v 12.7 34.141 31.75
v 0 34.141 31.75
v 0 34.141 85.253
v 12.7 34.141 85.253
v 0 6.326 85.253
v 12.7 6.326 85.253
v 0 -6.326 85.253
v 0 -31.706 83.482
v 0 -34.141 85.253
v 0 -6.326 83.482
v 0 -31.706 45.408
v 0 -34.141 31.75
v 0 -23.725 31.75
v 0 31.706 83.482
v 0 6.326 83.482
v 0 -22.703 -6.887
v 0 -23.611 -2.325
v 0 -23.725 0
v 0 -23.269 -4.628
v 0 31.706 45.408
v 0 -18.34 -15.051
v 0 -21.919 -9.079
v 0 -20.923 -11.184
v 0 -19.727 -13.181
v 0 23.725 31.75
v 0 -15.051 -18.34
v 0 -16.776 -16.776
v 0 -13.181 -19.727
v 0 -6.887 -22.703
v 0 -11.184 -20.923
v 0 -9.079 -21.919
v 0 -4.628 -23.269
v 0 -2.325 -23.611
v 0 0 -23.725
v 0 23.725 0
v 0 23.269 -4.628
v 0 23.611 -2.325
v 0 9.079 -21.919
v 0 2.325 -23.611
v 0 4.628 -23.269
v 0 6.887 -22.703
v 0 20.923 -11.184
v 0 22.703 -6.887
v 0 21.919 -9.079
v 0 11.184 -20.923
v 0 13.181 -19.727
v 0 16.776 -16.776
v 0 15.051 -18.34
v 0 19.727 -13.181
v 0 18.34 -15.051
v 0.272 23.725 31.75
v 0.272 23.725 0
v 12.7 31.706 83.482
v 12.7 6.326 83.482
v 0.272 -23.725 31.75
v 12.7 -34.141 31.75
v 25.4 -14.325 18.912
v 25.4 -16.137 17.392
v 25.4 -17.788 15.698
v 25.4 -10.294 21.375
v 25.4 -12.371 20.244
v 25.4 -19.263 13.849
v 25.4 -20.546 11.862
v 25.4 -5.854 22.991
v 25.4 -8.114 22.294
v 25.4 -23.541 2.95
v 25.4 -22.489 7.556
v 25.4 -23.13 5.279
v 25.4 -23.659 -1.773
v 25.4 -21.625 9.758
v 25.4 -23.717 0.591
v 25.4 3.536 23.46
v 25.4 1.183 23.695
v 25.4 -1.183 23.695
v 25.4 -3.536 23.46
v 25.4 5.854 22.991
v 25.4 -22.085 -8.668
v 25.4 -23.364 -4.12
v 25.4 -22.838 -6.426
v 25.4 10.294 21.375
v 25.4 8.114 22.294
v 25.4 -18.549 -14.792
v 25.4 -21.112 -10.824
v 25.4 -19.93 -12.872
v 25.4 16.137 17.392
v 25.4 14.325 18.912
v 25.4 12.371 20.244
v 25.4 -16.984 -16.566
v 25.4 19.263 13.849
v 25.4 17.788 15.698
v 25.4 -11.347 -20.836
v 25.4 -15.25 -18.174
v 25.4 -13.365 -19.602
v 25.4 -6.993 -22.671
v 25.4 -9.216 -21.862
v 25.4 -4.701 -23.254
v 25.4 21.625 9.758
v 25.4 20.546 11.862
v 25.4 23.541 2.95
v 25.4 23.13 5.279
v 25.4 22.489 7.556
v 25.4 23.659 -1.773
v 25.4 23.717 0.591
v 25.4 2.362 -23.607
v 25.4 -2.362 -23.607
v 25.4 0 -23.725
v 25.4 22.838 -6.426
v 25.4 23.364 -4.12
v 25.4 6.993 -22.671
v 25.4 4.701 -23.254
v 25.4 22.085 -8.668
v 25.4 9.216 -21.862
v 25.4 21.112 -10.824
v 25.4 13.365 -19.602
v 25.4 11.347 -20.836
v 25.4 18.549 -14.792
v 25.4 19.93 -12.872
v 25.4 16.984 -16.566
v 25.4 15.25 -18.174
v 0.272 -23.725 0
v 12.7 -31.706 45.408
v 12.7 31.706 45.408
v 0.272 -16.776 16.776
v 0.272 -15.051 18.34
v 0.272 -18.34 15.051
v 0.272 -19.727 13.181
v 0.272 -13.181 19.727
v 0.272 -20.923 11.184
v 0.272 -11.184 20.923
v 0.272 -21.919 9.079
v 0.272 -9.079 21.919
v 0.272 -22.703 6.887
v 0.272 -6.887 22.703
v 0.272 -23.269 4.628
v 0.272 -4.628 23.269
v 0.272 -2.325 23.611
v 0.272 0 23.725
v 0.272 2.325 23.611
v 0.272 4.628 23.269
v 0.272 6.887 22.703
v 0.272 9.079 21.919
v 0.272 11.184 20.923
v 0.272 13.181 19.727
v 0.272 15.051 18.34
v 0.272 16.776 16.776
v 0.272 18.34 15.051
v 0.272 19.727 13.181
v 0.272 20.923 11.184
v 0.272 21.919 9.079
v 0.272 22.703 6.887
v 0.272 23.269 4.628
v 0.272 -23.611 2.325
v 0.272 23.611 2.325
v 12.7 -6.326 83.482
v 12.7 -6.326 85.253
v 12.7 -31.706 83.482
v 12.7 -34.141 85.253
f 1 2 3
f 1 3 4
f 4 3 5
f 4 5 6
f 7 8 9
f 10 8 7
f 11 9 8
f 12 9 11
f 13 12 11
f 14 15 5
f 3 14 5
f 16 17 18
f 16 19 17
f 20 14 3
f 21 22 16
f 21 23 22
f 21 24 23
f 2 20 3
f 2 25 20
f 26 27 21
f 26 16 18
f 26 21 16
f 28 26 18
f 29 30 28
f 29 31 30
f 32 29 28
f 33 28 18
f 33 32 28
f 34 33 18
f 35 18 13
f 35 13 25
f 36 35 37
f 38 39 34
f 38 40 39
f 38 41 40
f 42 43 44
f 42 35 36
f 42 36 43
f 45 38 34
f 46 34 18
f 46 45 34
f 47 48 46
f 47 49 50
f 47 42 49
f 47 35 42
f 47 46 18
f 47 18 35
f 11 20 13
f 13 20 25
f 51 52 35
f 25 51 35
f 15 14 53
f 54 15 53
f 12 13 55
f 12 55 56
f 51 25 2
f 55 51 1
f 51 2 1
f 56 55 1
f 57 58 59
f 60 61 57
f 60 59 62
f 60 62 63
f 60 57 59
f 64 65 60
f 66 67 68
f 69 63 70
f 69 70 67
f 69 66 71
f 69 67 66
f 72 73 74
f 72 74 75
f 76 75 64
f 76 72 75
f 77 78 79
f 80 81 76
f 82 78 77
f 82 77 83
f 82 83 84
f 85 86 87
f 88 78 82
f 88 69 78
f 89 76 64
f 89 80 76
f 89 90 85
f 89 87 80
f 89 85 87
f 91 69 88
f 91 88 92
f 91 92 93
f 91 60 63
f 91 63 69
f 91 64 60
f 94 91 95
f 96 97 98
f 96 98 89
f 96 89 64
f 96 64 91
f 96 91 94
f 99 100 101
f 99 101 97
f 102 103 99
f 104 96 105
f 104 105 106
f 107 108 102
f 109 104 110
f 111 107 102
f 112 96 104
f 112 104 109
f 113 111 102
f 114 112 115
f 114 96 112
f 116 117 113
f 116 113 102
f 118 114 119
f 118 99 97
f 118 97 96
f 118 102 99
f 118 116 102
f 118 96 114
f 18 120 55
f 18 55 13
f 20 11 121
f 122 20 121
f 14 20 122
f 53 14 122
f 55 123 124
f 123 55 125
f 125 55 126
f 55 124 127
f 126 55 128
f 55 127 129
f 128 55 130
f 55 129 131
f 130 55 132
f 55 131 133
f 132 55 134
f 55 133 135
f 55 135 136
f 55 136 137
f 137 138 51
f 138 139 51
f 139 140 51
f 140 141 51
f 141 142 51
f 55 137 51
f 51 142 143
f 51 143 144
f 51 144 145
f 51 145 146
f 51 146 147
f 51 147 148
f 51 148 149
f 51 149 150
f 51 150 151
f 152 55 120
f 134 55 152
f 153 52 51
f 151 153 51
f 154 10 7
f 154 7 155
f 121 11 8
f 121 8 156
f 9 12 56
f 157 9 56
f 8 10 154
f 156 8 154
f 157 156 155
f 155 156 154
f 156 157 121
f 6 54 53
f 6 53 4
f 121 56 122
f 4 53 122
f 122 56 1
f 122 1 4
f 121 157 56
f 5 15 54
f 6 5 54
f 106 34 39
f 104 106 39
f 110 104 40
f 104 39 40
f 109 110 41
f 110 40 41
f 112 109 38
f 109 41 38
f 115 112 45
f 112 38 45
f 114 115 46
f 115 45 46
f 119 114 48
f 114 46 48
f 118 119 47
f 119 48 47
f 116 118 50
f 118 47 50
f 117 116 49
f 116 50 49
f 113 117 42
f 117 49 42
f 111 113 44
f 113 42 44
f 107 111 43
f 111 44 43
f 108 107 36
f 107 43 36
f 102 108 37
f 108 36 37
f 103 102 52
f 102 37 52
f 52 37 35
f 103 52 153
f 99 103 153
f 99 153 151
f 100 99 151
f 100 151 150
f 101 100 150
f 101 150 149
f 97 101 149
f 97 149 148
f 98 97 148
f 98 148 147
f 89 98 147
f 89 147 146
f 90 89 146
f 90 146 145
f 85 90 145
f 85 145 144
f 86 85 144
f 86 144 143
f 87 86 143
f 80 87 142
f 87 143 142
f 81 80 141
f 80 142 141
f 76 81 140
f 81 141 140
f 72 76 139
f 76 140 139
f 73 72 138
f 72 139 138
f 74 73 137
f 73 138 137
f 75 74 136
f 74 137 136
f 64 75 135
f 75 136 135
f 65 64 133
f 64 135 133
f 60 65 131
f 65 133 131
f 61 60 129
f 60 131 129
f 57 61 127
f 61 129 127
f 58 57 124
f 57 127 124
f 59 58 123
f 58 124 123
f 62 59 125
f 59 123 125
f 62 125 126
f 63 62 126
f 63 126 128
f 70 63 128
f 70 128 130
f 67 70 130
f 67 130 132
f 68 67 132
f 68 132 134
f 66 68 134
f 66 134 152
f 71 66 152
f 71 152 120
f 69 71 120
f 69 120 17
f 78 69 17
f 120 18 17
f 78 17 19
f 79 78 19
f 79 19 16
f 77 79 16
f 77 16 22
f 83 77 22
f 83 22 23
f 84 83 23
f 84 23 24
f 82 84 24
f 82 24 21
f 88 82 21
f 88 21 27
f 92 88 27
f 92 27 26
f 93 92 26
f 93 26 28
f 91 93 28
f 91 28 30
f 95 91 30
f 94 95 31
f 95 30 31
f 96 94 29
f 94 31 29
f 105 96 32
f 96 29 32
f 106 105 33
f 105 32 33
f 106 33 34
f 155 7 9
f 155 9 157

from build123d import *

# Parameters (mm, degrees)
SKETCH1_R           = 23.72487
BOSS_EXTRUDE1_DEPTH = 25.4
SKETCH2_W           = 47.44974
SKETCH2_H           = 0.27178
BOSS_EXTRUDE2_DEPTH = 31.75
SKETCH3_W           = 12.7
SKETCH3_H           = 68.28282
BOSS_EXTRUDE3_DEPTH = 13.65758
SKETCH4_W           = 12.7
SKETCH4_H           = 2.43586
BOSS_EXTRUDE4_DEPTH = 38.0746
SKETCH5_W           = 12.7
SKETCH5_H           = 27.81554
BOSS_EXTRUDE5_DEPTH = 1.77038


with BuildPart() as part:
    # Sketch1 → Boss-Extrude1 (new body)
    with BuildSketch(Plane.YZ):
        with Locations(Location((0, 0, 0), (0, 0, 270))):
            Circle(SKETCH1_R)
    extrude(amount=BOSS_EXTRUDE1_DEPTH)

    # Sketch2 → Boss-Extrude2 (add)
    with BuildSketch(Plane(origin=(0, 0, 0), x_dir=(0, 1, 0), z_dir=(0, 0, 1))):
        with Locations((0, -0.13589)):
            Rectangle(SKETCH2_W, SKETCH2_H)
    extrude(amount=BOSS_EXTRUDE2_DEPTH)

    # Sketch3 → Boss-Extrude3 (add)
    with BuildSketch(Plane.XY.offset(31.75)):
        with Locations((6.35, 0)):
            Rectangle(SKETCH3_W, SKETCH3_H)
    extrude(amount=BOSS_EXTRUDE3_DEPTH)

    # Sketch4 → Boss-Extrude4 (add)
    with BuildSketch(Plane.XY.offset(45.40758)):
        with Locations((6.35, 32.92348)):
            Rectangle(SKETCH4_W, SKETCH4_H)
        with Locations((6.35, -32.92348)):
            Rectangle(SKETCH4_W, SKETCH4_H)
    extrude(amount=BOSS_EXTRUDE4_DEPTH)

    # Sketch5 → Boss-Extrude5 (add)
    with BuildSketch(Plane.XY.offset(83.48218)):
        with Locations((6.35, 20.23364)):
            Rectangle(SKETCH5_W, SKETCH5_H)
        with Locations((6.35, -20.23364)):
            Rectangle(SKETCH5_W, SKETCH5_H)
    extrude(amount=BOSS_EXTRUDE5_DEPTH)


solid = part.part
